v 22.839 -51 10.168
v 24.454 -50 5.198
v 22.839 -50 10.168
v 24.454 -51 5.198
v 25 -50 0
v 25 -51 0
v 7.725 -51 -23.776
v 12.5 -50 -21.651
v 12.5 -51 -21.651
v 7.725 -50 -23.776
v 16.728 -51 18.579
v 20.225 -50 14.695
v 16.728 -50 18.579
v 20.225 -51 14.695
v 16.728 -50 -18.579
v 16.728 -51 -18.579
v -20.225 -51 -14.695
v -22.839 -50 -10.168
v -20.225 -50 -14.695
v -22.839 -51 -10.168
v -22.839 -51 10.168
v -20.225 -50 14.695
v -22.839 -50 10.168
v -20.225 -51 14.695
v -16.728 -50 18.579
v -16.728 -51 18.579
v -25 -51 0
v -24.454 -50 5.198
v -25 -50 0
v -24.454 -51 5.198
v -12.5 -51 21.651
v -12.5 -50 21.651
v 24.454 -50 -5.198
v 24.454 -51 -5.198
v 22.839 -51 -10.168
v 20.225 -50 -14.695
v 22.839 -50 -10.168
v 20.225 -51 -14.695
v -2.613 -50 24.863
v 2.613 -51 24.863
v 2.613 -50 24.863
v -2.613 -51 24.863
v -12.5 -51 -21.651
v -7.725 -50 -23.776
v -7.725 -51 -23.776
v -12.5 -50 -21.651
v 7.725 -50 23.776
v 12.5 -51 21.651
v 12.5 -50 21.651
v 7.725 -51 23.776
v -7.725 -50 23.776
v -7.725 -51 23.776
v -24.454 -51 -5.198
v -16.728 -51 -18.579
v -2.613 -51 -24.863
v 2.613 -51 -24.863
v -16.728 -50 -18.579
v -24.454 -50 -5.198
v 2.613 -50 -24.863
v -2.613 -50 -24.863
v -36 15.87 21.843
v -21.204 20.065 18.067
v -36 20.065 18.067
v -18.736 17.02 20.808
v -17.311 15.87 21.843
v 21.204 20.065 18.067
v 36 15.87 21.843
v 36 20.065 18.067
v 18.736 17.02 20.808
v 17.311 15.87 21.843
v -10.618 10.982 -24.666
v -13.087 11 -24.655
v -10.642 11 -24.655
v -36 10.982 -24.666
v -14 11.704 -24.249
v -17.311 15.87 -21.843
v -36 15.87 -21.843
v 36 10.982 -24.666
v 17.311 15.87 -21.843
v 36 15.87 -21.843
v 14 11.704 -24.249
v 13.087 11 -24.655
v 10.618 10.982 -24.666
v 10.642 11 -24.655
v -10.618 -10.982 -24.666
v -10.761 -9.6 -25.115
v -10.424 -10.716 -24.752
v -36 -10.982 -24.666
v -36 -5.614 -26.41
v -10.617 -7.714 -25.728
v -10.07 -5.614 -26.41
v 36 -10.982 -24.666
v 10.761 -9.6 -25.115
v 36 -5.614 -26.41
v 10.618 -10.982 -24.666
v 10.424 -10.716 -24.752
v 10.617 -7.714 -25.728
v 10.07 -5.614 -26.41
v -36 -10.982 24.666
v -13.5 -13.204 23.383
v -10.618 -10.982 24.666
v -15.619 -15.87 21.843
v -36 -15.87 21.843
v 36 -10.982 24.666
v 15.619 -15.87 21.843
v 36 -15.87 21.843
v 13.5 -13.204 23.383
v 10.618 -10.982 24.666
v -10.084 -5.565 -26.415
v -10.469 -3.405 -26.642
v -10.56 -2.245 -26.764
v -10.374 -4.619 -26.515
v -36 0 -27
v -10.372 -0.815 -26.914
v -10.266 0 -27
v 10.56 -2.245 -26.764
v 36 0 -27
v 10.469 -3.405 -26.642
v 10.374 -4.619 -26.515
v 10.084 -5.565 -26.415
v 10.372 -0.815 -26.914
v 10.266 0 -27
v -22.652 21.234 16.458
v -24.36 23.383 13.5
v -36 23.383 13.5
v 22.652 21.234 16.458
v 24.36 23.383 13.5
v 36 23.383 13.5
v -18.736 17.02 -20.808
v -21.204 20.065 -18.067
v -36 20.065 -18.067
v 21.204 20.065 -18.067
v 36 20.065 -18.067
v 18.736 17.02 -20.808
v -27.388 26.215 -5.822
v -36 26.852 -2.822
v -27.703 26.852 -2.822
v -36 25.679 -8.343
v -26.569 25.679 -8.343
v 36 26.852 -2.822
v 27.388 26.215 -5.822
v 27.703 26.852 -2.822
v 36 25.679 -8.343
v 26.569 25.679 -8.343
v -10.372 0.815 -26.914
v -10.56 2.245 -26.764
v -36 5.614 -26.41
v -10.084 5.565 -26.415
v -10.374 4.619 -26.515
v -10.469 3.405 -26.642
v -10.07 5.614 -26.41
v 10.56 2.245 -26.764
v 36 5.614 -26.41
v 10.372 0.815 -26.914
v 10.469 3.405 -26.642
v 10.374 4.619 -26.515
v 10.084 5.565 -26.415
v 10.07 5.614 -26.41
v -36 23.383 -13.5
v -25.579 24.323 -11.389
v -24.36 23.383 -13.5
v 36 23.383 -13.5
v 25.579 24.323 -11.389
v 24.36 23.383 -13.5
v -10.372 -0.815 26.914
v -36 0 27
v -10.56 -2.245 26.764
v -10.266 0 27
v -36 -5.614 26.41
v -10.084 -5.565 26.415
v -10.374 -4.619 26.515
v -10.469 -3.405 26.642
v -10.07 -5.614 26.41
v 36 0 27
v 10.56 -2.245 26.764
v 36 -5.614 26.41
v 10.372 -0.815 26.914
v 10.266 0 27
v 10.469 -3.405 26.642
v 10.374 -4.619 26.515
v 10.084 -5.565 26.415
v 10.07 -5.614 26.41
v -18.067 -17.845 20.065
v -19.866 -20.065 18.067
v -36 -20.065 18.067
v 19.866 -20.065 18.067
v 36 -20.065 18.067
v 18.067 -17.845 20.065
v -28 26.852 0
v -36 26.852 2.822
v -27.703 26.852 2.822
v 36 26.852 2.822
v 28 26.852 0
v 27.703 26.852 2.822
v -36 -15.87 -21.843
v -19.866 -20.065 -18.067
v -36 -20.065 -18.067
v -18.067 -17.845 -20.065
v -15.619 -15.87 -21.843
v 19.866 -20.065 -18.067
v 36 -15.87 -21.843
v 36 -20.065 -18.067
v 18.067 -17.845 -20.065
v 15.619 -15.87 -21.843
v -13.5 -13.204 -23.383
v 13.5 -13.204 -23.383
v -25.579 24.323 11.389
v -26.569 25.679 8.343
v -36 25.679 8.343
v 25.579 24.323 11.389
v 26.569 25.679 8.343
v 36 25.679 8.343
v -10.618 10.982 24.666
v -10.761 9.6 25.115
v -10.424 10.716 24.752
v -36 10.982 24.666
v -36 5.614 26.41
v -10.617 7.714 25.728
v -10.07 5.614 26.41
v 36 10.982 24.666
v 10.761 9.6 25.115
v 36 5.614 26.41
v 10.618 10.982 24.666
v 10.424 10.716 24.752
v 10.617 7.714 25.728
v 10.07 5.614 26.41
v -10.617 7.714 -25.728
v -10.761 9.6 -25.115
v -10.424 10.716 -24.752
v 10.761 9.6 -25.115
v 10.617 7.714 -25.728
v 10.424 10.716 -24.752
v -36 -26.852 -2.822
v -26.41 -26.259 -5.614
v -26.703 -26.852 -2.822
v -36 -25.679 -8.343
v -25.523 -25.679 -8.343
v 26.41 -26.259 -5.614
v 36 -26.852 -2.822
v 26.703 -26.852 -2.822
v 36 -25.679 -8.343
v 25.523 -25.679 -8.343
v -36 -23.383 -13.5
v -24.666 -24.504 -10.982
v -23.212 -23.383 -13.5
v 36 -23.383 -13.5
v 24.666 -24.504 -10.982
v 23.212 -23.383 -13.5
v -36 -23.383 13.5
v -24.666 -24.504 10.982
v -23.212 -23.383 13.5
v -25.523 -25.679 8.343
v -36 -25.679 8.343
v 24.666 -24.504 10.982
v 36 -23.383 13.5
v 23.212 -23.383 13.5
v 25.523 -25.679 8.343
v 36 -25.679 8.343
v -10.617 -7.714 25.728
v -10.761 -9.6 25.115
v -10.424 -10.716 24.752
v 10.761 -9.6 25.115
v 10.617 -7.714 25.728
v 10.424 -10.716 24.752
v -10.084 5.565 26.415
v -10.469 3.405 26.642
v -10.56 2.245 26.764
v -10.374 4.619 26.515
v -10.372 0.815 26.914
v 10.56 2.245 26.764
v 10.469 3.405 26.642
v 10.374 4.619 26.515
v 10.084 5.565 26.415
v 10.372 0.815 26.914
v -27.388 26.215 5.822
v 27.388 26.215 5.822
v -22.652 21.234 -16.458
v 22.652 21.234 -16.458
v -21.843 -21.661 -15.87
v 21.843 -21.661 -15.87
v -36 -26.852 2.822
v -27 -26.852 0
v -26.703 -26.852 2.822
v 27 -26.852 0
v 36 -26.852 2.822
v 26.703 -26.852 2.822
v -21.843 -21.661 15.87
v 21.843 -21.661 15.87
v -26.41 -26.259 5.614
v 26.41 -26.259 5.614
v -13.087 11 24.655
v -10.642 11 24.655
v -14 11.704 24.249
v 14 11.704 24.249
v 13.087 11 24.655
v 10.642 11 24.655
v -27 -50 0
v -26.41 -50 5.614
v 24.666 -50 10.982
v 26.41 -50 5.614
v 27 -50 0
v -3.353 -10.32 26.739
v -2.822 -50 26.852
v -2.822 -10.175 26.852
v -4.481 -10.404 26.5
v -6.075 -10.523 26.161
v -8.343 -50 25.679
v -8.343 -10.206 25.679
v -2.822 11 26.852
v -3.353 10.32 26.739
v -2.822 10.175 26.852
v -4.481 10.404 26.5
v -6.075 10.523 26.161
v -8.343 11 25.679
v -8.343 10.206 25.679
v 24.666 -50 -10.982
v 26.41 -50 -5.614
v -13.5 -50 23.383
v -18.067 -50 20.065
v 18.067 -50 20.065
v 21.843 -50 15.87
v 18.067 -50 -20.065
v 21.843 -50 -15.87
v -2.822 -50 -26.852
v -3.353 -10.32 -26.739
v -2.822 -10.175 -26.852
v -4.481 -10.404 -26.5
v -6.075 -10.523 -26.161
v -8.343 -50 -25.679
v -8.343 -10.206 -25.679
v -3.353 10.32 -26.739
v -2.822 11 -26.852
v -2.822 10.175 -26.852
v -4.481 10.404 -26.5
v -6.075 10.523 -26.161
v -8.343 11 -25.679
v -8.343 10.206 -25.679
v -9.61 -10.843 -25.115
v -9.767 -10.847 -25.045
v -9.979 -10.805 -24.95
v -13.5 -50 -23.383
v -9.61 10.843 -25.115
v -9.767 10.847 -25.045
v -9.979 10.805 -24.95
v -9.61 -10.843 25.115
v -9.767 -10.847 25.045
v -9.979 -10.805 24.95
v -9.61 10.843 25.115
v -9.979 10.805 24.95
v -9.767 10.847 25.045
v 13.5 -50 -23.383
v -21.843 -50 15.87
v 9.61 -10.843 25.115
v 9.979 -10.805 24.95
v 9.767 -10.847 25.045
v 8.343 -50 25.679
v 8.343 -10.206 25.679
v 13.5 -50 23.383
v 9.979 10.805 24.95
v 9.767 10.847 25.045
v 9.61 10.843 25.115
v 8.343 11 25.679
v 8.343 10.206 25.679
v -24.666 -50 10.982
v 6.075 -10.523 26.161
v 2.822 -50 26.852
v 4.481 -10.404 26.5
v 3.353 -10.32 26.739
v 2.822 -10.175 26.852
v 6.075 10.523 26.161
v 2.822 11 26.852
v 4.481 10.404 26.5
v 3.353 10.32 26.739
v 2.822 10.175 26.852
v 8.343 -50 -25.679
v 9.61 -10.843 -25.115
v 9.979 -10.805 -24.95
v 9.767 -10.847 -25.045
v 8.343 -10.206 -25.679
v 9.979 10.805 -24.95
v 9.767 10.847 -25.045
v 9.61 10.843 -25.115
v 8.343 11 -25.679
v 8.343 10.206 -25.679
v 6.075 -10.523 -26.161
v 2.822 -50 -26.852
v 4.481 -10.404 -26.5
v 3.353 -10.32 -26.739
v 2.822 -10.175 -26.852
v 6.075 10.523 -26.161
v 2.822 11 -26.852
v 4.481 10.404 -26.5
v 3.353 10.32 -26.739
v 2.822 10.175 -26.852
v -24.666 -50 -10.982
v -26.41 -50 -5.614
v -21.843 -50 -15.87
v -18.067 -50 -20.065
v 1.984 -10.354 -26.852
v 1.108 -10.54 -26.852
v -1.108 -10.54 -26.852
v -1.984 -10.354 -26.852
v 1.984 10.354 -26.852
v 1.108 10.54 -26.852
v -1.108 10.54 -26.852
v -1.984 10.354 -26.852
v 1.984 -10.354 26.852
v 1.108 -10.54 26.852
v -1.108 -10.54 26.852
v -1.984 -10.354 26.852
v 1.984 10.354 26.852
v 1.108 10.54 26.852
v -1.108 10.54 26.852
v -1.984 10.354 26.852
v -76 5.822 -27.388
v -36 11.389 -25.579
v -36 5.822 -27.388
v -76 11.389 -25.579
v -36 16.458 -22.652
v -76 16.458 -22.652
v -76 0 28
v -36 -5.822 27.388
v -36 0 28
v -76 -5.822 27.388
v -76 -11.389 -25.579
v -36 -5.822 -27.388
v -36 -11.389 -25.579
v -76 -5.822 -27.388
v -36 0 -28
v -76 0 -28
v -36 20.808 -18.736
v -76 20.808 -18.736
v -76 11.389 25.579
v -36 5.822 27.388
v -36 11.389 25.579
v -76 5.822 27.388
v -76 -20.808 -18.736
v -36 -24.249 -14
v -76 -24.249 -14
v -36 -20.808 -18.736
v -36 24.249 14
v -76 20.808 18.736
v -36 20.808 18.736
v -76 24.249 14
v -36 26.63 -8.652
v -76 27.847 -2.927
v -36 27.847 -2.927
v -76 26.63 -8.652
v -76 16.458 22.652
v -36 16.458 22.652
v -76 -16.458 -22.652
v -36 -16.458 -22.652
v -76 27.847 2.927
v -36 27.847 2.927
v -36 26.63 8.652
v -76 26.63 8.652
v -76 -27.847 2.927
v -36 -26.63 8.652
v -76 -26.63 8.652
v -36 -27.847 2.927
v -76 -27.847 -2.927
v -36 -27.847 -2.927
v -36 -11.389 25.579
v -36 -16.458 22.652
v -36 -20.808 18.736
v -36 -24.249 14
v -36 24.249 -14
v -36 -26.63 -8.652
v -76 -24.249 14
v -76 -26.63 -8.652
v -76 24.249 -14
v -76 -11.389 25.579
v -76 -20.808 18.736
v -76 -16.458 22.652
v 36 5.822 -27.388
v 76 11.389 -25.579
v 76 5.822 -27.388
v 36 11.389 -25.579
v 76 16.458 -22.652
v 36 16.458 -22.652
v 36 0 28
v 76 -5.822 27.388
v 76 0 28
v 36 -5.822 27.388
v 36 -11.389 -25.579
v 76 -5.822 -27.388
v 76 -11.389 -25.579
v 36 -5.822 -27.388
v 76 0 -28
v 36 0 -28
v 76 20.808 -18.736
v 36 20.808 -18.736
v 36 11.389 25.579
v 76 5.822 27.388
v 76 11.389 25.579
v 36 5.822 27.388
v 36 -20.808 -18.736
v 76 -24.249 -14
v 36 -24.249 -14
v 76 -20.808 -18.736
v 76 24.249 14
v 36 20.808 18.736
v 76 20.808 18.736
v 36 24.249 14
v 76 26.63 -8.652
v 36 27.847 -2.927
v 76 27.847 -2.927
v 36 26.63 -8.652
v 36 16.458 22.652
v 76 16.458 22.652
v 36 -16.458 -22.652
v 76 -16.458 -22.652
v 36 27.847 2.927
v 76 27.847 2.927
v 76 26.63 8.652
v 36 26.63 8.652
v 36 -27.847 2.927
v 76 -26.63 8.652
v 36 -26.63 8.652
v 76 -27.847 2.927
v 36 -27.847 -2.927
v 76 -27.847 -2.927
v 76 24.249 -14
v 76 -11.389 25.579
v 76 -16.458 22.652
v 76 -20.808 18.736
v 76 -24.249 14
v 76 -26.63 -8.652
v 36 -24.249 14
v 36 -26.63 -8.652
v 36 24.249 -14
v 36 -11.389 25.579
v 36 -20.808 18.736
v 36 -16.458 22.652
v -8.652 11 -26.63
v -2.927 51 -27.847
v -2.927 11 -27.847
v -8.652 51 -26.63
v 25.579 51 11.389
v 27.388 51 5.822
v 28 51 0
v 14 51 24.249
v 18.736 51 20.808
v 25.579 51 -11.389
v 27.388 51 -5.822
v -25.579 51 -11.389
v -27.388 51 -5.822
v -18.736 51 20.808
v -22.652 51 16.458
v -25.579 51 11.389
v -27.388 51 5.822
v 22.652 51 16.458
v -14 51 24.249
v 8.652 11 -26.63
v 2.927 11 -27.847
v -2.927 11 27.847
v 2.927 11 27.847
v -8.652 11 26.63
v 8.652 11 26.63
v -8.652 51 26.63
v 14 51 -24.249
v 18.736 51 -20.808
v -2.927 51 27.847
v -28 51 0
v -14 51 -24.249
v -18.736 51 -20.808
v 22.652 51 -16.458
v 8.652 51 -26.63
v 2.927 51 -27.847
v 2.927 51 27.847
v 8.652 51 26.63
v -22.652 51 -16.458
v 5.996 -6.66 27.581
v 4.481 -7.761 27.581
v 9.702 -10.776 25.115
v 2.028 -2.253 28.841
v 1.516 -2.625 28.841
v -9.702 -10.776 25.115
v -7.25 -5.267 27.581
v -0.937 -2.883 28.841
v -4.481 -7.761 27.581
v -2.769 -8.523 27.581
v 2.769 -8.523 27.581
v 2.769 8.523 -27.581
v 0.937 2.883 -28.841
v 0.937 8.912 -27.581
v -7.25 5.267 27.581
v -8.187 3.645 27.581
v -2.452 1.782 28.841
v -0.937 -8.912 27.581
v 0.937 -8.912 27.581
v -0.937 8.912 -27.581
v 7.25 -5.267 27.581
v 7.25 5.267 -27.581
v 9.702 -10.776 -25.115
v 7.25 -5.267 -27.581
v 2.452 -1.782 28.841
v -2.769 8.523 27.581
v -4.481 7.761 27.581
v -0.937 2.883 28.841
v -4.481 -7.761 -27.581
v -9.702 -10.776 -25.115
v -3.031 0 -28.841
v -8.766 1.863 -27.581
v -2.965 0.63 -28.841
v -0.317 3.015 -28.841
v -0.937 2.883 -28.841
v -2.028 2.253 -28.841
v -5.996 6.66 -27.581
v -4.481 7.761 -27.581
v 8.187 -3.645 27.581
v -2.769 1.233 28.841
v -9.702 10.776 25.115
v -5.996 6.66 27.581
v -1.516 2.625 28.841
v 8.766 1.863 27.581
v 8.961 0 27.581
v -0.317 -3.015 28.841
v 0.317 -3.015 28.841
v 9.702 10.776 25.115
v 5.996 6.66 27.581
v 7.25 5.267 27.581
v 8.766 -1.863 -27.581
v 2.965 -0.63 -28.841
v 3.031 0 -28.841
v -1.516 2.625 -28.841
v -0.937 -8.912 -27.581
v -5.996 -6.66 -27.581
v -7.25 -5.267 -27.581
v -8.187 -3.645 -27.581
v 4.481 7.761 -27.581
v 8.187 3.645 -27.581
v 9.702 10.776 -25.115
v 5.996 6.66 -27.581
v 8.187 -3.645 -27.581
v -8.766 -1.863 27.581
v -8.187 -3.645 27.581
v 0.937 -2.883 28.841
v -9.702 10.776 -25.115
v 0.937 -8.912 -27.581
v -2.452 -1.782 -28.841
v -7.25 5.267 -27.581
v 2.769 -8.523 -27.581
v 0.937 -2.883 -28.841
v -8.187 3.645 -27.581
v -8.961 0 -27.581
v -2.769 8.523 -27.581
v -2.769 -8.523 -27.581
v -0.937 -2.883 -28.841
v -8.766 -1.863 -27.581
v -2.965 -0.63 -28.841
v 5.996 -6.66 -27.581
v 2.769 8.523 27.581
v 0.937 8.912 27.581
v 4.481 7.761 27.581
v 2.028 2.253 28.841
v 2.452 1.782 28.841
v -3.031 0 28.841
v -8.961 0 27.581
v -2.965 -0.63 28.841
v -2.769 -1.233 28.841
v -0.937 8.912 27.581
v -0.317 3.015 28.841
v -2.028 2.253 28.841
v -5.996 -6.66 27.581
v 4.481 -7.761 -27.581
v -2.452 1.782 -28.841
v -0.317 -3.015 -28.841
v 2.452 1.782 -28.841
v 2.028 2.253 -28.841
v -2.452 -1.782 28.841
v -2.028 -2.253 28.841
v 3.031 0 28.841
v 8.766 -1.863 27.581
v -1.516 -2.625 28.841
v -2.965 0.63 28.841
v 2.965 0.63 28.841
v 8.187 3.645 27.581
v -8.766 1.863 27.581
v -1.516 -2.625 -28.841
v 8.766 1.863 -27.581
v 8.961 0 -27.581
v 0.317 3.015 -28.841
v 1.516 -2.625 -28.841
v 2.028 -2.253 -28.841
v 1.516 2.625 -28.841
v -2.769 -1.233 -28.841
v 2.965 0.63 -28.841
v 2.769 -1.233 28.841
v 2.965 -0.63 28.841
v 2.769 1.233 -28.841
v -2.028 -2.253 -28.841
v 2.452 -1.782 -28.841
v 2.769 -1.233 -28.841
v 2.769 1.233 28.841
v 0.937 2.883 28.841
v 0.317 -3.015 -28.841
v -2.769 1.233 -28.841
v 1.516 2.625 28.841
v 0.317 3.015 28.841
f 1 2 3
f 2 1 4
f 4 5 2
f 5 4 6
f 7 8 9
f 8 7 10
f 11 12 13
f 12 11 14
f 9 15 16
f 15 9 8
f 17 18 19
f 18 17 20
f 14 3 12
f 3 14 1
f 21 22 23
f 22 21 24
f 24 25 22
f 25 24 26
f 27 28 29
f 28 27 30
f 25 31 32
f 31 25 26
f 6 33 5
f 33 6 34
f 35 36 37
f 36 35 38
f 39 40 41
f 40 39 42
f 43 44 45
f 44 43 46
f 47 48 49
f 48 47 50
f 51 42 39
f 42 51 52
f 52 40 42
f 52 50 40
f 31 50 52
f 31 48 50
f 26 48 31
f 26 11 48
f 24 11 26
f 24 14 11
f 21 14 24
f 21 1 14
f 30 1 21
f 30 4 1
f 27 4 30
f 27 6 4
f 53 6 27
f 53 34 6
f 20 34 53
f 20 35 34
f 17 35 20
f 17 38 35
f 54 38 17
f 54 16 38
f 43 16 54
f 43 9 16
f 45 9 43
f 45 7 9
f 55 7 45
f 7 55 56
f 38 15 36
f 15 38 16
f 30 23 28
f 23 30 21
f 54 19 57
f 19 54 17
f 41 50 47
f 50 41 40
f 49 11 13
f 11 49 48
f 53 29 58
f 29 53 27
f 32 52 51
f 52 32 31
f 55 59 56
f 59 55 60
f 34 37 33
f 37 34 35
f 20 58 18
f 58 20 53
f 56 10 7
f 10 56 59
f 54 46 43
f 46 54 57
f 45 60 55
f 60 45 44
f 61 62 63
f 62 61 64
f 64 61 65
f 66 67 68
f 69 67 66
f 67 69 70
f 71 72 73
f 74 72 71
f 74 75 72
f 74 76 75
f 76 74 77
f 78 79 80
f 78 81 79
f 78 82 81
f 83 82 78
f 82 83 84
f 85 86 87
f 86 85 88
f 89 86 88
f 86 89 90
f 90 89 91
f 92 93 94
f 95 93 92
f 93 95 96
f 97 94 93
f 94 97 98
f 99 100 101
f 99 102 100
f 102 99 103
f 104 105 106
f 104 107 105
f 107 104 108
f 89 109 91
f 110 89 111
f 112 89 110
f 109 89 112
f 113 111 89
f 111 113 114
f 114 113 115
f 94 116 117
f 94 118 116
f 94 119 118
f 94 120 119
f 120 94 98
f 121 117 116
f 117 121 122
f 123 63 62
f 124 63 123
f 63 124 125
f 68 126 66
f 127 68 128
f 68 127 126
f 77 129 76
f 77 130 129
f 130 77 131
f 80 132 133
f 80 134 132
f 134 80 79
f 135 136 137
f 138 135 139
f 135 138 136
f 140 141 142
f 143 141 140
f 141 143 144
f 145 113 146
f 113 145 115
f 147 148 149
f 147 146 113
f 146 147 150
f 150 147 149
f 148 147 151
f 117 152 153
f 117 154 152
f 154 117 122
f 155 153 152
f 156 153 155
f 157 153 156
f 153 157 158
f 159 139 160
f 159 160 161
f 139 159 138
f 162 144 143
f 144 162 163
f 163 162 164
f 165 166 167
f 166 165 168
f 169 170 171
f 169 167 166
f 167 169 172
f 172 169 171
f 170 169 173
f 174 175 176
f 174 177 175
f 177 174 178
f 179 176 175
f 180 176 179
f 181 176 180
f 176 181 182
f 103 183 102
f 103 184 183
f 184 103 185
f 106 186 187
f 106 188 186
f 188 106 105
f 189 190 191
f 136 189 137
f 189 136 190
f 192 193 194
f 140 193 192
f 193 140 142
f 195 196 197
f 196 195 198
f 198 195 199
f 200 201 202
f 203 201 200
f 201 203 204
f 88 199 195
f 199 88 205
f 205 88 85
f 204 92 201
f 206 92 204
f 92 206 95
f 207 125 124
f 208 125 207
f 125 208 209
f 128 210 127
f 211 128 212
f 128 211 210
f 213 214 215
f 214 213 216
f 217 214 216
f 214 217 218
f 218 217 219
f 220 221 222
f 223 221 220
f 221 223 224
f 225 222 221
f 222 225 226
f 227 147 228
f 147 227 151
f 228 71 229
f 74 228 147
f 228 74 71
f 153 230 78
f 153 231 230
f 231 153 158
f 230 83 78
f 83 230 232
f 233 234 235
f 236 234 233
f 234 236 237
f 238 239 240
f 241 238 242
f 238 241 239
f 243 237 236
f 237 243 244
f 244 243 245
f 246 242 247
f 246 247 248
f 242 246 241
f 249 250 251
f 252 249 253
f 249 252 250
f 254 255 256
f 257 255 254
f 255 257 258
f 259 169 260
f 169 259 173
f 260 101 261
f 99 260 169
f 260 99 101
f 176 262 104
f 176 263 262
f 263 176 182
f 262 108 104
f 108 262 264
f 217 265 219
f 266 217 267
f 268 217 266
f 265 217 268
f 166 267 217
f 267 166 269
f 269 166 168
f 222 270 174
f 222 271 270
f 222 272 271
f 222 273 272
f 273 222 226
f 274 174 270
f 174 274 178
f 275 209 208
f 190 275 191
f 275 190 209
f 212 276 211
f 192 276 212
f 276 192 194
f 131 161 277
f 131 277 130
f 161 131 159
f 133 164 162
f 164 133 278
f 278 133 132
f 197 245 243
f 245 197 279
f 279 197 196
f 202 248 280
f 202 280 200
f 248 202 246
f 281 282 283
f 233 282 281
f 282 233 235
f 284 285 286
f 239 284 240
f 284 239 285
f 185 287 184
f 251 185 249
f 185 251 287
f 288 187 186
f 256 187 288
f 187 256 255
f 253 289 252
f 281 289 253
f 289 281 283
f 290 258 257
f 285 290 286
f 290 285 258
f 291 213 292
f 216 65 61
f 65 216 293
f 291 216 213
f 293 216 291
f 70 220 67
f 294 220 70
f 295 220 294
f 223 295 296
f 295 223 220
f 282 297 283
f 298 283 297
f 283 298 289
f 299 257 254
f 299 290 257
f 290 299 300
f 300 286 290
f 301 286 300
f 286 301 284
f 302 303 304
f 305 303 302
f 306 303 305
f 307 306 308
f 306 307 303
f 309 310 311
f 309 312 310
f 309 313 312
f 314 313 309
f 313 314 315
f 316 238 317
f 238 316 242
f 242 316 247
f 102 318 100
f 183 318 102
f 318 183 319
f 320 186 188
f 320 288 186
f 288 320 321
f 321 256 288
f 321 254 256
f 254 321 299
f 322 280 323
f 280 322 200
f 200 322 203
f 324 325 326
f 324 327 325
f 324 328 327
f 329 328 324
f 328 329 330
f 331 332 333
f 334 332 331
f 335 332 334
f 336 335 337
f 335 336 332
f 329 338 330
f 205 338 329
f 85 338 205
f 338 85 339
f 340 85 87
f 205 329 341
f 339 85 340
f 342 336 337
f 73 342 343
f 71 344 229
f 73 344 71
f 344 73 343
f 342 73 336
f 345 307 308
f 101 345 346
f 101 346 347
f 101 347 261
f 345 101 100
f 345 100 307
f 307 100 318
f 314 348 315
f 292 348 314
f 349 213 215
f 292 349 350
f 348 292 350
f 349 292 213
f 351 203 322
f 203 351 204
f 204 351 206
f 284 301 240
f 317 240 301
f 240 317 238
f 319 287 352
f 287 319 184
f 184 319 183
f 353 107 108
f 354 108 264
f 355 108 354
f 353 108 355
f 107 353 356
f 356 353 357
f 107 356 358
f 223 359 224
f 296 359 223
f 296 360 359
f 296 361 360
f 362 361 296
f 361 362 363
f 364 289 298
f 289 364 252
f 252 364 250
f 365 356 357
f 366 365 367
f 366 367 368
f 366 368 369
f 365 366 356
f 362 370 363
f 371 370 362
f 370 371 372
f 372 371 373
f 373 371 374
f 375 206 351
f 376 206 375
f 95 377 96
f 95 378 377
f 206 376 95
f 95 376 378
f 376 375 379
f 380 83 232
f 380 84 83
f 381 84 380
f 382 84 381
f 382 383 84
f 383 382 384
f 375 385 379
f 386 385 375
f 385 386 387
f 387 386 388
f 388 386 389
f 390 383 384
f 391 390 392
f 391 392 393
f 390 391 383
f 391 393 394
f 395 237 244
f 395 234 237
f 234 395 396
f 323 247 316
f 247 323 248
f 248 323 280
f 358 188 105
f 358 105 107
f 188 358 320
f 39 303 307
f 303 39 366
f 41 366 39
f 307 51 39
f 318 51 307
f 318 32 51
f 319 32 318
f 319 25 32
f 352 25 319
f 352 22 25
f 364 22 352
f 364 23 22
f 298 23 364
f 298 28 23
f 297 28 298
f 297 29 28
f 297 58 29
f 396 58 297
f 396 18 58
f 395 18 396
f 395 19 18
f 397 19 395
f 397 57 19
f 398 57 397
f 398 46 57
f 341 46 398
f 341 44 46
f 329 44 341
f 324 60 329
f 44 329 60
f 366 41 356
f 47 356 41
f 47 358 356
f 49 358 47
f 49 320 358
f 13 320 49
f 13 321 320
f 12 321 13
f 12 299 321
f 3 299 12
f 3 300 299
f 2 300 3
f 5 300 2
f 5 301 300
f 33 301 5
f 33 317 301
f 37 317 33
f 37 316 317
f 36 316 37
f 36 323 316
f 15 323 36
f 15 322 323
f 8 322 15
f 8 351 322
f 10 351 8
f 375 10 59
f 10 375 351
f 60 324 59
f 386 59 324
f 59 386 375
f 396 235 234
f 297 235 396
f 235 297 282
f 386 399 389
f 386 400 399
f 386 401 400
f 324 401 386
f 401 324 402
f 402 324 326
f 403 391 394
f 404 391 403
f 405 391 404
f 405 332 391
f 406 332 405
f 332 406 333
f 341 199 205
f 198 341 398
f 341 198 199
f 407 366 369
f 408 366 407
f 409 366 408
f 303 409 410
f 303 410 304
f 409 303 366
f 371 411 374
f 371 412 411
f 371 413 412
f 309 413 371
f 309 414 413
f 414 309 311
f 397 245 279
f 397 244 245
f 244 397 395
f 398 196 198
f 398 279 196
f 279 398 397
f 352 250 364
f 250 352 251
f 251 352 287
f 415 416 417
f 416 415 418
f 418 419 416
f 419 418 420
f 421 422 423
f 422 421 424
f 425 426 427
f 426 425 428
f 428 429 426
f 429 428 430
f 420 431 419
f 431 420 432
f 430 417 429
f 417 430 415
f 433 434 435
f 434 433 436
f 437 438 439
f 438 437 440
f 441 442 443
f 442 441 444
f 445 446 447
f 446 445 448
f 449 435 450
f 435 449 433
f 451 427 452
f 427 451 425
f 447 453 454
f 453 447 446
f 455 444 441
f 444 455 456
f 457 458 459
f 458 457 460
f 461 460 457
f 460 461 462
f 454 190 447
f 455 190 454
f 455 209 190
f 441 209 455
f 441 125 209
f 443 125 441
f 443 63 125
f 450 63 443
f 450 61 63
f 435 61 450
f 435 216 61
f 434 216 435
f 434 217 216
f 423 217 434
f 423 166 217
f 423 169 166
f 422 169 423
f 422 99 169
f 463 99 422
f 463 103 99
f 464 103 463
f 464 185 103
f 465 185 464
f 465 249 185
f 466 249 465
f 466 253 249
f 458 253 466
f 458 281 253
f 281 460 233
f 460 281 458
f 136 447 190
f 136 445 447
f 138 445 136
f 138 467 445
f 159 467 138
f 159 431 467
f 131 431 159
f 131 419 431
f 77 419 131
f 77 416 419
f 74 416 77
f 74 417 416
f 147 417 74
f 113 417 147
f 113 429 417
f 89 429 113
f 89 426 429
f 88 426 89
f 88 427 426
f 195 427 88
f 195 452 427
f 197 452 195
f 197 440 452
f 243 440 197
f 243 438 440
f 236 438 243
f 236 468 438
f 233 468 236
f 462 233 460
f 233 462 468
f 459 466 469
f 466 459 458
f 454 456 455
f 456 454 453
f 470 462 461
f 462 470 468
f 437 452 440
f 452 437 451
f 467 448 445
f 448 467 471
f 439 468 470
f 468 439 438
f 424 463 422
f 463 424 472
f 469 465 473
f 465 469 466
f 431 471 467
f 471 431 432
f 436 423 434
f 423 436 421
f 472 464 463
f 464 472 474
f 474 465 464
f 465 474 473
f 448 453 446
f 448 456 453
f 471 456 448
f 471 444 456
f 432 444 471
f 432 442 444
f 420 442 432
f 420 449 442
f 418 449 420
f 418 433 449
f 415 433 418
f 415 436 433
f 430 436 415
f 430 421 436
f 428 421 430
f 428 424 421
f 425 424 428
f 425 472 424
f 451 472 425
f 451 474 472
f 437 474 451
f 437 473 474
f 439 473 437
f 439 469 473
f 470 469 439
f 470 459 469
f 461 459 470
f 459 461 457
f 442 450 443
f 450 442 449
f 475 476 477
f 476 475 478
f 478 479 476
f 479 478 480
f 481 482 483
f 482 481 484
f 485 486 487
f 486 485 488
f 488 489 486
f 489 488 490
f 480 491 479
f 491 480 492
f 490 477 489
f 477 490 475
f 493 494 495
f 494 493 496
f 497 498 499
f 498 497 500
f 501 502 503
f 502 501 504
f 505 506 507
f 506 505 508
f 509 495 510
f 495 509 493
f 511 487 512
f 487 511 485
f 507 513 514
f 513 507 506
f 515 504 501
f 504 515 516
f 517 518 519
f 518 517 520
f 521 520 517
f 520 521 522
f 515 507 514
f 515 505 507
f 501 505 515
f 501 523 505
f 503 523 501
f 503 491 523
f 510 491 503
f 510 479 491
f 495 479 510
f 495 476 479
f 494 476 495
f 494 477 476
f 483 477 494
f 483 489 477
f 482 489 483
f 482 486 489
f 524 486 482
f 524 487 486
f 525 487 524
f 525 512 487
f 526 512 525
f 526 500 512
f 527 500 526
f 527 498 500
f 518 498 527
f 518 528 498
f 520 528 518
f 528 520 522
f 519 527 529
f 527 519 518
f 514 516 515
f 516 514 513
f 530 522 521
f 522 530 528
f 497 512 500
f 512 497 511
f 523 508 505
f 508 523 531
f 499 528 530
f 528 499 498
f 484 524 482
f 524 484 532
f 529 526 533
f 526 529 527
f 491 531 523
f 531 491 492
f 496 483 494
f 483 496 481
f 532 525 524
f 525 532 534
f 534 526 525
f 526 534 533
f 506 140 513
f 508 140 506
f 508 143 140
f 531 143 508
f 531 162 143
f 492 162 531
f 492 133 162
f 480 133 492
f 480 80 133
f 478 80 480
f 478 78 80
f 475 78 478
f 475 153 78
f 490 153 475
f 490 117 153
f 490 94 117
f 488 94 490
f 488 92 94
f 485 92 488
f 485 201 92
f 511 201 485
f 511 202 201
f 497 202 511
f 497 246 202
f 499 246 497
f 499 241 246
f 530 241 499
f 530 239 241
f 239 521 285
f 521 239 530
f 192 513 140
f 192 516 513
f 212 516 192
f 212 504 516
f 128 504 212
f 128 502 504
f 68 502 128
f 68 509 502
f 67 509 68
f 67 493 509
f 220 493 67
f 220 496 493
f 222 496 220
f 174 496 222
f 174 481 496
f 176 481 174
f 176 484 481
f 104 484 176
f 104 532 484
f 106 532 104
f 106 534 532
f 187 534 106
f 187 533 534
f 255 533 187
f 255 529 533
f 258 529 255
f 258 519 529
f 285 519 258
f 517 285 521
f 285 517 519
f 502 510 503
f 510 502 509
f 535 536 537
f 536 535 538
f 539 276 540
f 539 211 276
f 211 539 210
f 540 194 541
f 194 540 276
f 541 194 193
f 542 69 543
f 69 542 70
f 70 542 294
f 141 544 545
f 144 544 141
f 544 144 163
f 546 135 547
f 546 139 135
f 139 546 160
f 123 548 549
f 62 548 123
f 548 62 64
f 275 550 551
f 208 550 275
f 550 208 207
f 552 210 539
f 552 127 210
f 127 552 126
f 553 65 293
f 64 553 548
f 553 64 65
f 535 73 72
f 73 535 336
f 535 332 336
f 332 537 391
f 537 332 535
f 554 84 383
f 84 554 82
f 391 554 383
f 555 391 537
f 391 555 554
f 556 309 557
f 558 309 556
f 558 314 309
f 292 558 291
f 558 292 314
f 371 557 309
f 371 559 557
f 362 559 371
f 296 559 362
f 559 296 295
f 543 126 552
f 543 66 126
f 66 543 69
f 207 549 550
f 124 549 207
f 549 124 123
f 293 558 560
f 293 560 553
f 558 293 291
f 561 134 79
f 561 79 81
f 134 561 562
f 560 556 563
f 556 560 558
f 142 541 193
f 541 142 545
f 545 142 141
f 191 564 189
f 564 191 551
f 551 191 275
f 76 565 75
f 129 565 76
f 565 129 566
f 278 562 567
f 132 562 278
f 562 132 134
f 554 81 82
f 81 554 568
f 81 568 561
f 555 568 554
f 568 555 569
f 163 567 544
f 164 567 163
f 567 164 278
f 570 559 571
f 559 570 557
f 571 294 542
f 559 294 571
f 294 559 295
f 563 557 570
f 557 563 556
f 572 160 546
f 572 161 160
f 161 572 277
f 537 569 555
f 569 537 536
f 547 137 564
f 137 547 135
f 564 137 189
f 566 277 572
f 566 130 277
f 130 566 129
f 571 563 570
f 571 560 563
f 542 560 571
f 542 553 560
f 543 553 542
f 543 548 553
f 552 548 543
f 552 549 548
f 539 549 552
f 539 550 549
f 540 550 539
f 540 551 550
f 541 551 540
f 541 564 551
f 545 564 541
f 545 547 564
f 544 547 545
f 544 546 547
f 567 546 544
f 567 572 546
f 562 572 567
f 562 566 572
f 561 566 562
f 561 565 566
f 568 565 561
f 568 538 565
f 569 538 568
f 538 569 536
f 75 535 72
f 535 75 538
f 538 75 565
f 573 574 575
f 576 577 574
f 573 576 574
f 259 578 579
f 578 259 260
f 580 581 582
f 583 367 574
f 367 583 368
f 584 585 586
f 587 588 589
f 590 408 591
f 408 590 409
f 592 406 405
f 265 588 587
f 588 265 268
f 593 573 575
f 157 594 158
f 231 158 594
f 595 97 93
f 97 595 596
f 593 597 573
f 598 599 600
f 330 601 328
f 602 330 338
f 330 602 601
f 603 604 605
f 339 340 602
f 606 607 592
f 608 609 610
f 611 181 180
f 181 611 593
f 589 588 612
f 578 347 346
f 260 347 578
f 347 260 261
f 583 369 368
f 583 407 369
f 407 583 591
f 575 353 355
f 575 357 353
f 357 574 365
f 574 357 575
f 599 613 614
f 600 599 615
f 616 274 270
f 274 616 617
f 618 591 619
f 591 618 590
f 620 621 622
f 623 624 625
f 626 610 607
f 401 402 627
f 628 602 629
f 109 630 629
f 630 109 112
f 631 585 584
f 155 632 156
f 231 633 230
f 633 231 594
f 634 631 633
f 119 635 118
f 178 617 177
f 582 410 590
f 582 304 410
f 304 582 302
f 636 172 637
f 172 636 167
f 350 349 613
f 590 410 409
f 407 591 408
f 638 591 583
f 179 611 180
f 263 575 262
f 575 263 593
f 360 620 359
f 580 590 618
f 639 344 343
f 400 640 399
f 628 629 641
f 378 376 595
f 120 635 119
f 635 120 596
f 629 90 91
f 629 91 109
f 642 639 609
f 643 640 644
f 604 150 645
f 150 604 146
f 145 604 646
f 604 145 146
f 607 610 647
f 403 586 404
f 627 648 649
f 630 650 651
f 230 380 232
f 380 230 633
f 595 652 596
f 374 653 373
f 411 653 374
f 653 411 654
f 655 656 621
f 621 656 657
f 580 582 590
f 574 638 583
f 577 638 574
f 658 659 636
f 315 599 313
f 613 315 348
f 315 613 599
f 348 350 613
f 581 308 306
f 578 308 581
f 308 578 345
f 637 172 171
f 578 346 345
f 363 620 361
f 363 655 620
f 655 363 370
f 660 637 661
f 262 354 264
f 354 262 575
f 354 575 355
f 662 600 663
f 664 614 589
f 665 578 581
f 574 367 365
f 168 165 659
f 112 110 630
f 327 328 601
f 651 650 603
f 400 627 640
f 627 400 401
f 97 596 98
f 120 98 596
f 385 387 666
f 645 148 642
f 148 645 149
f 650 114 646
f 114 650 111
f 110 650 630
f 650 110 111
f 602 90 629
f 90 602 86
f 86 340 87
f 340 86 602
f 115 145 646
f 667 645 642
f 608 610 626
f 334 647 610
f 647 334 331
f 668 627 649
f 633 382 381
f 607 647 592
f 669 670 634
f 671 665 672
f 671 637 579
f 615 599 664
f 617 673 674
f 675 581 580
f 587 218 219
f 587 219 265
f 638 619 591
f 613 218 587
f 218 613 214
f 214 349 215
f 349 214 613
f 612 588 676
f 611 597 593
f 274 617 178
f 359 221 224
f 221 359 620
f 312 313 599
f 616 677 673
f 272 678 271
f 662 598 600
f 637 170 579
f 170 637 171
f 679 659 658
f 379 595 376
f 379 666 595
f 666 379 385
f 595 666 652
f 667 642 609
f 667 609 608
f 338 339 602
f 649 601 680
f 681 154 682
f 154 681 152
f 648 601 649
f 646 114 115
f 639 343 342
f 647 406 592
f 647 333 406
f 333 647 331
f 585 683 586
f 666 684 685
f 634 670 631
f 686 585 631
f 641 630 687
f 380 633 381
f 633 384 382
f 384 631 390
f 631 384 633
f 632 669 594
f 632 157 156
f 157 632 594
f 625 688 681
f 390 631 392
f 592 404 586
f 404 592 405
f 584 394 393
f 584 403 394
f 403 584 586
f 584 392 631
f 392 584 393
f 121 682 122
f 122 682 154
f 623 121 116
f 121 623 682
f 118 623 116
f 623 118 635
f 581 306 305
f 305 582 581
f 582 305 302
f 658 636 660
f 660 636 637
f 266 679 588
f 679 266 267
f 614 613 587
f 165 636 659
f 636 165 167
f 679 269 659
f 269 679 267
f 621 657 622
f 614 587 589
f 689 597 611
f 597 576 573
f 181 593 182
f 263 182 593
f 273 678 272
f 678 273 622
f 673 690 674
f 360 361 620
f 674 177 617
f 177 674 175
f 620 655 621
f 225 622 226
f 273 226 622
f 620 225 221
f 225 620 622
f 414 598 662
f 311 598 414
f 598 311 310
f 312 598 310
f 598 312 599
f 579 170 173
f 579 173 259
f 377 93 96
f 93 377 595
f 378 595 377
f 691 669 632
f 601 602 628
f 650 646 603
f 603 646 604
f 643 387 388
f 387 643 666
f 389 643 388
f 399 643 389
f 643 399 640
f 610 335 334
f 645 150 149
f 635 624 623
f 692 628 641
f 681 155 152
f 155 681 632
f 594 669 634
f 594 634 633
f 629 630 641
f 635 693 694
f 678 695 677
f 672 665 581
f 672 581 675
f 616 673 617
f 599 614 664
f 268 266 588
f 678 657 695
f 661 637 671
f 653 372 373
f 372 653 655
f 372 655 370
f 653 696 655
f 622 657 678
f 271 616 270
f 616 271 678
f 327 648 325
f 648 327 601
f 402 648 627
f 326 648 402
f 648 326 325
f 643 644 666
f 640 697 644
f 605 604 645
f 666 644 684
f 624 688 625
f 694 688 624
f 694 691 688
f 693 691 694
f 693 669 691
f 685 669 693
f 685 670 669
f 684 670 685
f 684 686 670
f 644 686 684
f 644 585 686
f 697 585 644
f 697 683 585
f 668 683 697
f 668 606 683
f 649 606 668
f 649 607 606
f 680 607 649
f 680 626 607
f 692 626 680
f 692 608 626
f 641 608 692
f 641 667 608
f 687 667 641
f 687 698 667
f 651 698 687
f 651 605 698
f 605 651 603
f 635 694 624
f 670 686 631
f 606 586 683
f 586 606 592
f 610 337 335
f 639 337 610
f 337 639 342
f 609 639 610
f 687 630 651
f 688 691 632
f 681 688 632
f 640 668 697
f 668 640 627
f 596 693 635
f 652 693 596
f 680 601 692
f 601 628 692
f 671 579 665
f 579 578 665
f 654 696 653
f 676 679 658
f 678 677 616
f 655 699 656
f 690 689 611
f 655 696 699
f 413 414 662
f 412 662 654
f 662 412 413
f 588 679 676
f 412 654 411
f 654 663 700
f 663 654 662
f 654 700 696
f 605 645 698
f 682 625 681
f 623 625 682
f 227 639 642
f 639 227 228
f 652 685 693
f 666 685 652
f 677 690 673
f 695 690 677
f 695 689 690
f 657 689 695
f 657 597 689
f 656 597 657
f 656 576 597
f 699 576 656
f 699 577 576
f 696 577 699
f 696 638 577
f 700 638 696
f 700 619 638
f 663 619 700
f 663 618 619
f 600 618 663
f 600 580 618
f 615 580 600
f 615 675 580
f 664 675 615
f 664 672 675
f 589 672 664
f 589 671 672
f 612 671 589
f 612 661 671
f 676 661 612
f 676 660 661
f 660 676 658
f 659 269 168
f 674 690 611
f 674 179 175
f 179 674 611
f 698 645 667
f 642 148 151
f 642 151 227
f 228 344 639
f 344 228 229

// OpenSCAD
// Parameters
nominal_diameter_mm = 50; //[25:100:1]
bore_inner_diameter_mm = 50; //[25:100:1]
wall_thickness_mm = 2; //[1:4:0.1]
main_run_length_mm = 150; //[75:300:1]
branch_length_mm = 100; //[50:200:1]
socket_depth_mm = 40; //[20:80:1]
socket_outer_diameter_mm = 56; //[50:80:0.5]
branch_angle_deg = 90; //[45:90:1]
fillet_radius_mm = 2; //[0.5:6:0.5]
overlap_mm = 1; //[0.5:2:0.1]
main_outer_diameter_mm = 54; //[50:70:0.5]
branch_outer_diameter_mm = 54; //[50:70:0.5]
socket_inner_diameter_mm = 50.5; //[50:55:0.1]

// Module for HT Pipe
module ht_pipe() {
  color([0.85, 0.85, 0.8]) {
    // Main outer body
    rotate([0, 90, 0])
      cylinder(r=main_outer_diameter_mm/2, h=main_run_length_mm, center=true);

    // Branch outer body
    rotate([90, 0, 0])
      cylinder(r=branch_outer_diameter_mm/2, h=branch_length_mm, center=true);

    // Socket ends
    translate([-(main_run_length_mm/2 - socket_depth_mm/2 + overlap_mm), 0, 0])
      rotate([0, 90, 0])
      cylinder(r=socket_outer_diameter_mm/2, h=socket_depth_mm, center=true);

    translate([(main_run_length_mm/2 - socket_depth_mm/2 + overlap_mm), 0, 0])
      rotate([0, 90, 0])
      cylinder(r=socket_outer_diameter_mm/2, h=socket_depth_mm, center=true);

    translate([0, (branch_length_mm/2 - socket_depth_mm/2 + overlap_mm), 0])
      rotate([90, 0, 0])
      cylinder(r=socket_outer_diameter_mm/2, h=socket_depth_mm, center=true);

    // Intersection blend
    hull() {
      sphere(r=main_outer_diameter_mm/2 + fillet_radius_mm, center=true);
      sphere(r=branch_outer_diameter_mm/2 + fillet_radius_mm, center=true);
    }

    // Internal bore
    difference() {
      union() {
        rotate([0, 90, 0])
          cylinder(r=bore_inner_diameter_mm/2, h=main_run_length_mm + 2*overlap_mm, center=true);

        rotate([90, 0, 0])
          cylinder(r=bore_inner_diameter_mm/2, h=branch_length_mm + 2*overlap_mm, center=true);
      }

      // Socket voids
      translate([-(main_run_length_mm/2 - socket_depth_mm/2 + overlap_mm), 0, 0])
        rotate([0, 90, 0])
        cylinder(r=socket_inner_diameter_mm/2, h=socket_depth_mm + 2*overlap_mm, center=true);

      translate([(main_run_length_mm/2 - socket_depth_mm/2 + overlap_mm), 0, 0])
        rotate([0, 90, 0])
        cylinder(r=socket_inner_diameter_mm/2, h=socket_depth_mm + 2*overlap_mm, center=true);

      translate([0, (branch_length_mm/2 - socket_depth_mm/2 + overlap_mm), 0])
        rotate([90, 0, 0])
        cylinder(r=socket_inner_diameter_mm/2, h=socket_depth_mm + 2*overlap_mm, center=true);
    }
  }
}

// Assembly
module assembly() {
  ht_pipe();
}

assembly();
